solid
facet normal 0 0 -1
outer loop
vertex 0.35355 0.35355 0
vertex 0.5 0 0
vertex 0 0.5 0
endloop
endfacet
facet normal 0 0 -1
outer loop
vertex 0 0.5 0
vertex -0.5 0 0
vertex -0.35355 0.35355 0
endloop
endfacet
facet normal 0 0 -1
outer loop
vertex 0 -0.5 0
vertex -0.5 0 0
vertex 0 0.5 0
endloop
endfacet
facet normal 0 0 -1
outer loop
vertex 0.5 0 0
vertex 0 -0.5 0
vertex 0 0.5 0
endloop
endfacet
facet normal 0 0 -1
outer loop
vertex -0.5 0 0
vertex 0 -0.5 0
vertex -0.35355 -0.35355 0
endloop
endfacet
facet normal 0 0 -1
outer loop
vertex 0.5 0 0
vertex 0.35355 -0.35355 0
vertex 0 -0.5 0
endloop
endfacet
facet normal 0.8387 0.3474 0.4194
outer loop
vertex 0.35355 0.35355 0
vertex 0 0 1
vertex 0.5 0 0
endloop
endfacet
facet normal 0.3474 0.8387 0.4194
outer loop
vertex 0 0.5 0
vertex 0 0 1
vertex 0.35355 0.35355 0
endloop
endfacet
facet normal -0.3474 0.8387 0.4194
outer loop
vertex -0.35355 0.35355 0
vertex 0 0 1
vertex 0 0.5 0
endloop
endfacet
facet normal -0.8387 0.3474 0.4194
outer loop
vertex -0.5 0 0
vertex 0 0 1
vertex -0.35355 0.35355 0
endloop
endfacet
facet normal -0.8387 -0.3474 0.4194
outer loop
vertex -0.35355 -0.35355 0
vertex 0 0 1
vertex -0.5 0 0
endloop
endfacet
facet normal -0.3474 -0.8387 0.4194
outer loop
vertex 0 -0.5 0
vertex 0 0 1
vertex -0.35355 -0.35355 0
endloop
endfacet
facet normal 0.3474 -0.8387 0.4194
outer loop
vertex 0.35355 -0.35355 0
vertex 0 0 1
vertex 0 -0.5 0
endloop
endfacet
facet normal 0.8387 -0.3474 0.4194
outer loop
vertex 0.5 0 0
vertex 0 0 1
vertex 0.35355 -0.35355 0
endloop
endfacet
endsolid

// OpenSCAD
// Octagon Pyramid for Stacks of Shapes
// by Slashee the Cow

linear_extrude(1, scale = 0)
circle(d=1, $fn=8);
